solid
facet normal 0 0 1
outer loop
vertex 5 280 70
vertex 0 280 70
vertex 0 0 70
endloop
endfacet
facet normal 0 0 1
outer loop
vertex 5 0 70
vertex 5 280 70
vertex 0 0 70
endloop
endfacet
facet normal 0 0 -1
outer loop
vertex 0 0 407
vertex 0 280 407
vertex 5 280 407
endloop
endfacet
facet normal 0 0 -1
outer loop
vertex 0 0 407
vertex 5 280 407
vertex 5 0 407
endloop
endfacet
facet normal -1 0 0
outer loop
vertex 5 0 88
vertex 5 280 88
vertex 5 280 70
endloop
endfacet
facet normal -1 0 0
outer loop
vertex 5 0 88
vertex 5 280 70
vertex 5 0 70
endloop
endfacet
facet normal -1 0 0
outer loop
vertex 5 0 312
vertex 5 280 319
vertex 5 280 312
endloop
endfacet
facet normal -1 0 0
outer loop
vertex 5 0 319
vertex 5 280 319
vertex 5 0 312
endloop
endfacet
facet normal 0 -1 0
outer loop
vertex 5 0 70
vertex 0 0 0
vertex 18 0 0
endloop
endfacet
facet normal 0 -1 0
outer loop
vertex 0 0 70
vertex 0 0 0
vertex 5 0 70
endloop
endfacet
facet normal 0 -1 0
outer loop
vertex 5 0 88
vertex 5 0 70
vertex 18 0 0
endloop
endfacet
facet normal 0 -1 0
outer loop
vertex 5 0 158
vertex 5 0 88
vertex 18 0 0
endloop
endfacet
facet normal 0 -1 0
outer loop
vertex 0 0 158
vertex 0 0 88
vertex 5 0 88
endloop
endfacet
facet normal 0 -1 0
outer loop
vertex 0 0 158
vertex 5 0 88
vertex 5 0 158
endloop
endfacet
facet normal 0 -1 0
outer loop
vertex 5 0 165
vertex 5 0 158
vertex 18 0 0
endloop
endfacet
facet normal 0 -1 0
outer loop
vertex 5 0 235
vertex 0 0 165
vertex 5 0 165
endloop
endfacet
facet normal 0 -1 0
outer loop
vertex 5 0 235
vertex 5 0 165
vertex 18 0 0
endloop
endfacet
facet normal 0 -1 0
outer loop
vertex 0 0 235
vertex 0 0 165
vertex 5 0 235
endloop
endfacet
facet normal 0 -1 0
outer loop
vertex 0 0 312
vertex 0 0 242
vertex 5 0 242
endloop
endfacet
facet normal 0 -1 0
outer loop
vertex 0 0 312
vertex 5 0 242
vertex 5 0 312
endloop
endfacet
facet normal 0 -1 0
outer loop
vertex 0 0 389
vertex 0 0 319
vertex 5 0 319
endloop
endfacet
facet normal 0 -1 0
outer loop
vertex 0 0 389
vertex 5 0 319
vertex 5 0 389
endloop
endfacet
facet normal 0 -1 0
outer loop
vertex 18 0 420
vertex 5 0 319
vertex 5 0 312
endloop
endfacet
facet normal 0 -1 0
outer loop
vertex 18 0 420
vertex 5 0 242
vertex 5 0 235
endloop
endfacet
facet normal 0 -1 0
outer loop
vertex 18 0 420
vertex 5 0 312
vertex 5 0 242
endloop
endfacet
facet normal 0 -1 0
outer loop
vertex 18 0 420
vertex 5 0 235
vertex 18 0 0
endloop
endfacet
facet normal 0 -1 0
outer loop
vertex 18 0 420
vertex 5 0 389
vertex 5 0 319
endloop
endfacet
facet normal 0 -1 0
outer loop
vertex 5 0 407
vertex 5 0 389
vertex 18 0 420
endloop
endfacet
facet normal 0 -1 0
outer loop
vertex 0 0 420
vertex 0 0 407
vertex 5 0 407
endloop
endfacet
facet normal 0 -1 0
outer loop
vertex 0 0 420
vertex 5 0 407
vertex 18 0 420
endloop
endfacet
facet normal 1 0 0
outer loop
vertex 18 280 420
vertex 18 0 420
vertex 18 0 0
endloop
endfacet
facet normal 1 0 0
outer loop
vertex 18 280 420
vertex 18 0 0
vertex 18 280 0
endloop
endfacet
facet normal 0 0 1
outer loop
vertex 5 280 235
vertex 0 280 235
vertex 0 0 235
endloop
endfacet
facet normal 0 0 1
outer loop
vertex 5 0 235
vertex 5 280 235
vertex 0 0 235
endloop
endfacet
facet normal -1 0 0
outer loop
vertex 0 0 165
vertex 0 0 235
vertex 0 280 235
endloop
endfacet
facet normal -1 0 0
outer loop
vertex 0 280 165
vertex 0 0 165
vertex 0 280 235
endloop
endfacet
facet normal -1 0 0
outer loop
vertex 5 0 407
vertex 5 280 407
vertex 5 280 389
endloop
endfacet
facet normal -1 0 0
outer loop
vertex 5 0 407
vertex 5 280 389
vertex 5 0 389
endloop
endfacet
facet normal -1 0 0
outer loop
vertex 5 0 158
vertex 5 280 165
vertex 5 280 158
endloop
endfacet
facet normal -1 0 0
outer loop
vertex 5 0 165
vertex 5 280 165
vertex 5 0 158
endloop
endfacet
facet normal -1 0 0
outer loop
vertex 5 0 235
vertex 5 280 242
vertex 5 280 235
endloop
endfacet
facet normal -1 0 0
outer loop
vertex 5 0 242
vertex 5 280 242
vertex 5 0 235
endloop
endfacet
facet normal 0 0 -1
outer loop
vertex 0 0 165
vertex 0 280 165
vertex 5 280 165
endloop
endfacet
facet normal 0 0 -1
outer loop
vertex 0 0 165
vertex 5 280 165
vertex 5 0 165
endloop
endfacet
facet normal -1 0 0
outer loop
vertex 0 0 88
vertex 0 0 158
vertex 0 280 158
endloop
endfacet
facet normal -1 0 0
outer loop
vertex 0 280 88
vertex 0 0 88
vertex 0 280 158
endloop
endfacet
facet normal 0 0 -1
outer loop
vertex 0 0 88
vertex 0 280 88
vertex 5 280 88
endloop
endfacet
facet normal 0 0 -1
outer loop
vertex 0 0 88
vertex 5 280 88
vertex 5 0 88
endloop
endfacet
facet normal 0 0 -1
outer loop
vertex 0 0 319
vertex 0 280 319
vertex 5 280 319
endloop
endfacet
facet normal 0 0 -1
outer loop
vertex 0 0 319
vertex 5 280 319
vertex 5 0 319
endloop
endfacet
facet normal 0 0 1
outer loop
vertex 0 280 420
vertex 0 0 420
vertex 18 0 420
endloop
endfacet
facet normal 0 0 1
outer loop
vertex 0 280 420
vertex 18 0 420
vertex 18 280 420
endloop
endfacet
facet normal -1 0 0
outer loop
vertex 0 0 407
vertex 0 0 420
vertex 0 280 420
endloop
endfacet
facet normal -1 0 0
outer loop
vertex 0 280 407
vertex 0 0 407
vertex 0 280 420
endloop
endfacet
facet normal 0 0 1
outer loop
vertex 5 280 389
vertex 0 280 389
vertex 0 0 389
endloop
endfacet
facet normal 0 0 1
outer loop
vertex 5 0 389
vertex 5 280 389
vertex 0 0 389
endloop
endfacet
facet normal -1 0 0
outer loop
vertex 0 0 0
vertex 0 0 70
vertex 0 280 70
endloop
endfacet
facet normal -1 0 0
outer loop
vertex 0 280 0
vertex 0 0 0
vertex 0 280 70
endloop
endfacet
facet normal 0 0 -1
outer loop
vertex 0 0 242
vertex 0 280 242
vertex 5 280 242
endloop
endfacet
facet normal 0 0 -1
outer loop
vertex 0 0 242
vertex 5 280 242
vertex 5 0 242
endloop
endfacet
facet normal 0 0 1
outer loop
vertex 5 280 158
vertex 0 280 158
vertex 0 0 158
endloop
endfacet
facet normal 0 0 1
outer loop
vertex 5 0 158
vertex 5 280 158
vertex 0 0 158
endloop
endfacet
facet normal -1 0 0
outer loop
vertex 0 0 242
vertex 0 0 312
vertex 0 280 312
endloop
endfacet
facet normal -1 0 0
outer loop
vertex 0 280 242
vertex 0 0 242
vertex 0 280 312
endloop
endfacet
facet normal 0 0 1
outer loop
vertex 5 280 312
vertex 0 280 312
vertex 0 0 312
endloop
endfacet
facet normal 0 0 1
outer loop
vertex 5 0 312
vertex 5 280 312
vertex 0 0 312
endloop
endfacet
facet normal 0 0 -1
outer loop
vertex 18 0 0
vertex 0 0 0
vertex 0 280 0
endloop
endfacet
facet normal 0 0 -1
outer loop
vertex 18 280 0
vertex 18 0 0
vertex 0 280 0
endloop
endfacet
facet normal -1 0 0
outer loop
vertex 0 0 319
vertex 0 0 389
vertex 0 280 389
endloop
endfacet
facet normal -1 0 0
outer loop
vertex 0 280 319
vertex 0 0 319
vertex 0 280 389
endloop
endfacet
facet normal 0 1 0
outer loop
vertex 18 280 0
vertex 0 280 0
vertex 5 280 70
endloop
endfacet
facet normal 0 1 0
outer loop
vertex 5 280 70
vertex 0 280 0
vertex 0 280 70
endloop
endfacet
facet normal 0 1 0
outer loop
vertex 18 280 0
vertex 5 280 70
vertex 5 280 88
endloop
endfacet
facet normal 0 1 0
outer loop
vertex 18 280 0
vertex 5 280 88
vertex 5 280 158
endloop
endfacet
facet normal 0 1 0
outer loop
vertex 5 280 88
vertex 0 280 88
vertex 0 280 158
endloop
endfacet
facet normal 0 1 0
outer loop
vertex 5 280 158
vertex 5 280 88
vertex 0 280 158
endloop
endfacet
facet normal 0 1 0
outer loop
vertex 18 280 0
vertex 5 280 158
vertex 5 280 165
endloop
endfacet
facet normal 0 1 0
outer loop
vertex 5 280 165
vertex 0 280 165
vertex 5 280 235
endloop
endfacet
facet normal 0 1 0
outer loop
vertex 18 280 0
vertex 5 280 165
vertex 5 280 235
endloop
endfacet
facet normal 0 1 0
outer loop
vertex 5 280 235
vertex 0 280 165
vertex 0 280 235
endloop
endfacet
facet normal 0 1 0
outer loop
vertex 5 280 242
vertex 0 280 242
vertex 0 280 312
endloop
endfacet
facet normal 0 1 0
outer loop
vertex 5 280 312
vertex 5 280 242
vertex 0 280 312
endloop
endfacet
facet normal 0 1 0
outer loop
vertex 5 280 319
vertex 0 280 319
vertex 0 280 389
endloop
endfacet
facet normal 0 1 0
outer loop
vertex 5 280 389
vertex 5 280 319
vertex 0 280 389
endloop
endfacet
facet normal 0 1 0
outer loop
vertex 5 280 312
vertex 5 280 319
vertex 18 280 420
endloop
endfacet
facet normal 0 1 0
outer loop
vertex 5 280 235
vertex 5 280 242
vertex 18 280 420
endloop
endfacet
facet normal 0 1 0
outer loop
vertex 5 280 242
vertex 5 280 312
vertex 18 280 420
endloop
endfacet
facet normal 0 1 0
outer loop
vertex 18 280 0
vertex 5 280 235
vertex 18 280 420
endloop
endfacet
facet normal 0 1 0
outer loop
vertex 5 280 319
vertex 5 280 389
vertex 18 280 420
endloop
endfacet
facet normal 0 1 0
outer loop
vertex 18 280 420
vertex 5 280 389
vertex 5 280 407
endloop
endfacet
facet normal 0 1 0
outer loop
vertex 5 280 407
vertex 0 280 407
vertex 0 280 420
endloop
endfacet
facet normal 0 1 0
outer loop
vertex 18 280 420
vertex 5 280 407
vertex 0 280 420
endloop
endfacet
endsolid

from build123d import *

# Parameters (mm, degrees)
F0_W     = 280
F0_H     = 420
F1_DEPTH = 18
F2_W     = 280
F2_H     = 18
F2_H_2   = 7
F3_DEPTH = 5


with BuildPart() as f1:
    # F0 (on Right) → F1 (new body)
    with BuildSketch(Plane.YZ):
        with Locations((140, 210)):
            Rectangle(F0_W, F0_H)
    extrude(amount=F1_DEPTH)

    # F2 (on face) → F3 (cut)
    with BuildSketch(Plane(origin=(0, 0, 0), x_dir=(0, -1, 0), z_dir=(-1, 0, 0))):
        with Locations((-140, 79)):
            Rectangle(F2_W, F2_H)
        with Locations((-140, 161.5)):
            Rectangle(F2_W, F2_H_2)
        with Locations((-140, 238.5)):
            Rectangle(F2_W, F2_H_2)
        with Locations((-140, 315.5)):
            Rectangle(F2_W, F2_H_2)
        with Locations((-140, 398)):
            Rectangle(F2_W, F2_H)
    extrude(amount=-F3_DEPTH, mode=Mode.SUBTRACT)


solid = f1.part
